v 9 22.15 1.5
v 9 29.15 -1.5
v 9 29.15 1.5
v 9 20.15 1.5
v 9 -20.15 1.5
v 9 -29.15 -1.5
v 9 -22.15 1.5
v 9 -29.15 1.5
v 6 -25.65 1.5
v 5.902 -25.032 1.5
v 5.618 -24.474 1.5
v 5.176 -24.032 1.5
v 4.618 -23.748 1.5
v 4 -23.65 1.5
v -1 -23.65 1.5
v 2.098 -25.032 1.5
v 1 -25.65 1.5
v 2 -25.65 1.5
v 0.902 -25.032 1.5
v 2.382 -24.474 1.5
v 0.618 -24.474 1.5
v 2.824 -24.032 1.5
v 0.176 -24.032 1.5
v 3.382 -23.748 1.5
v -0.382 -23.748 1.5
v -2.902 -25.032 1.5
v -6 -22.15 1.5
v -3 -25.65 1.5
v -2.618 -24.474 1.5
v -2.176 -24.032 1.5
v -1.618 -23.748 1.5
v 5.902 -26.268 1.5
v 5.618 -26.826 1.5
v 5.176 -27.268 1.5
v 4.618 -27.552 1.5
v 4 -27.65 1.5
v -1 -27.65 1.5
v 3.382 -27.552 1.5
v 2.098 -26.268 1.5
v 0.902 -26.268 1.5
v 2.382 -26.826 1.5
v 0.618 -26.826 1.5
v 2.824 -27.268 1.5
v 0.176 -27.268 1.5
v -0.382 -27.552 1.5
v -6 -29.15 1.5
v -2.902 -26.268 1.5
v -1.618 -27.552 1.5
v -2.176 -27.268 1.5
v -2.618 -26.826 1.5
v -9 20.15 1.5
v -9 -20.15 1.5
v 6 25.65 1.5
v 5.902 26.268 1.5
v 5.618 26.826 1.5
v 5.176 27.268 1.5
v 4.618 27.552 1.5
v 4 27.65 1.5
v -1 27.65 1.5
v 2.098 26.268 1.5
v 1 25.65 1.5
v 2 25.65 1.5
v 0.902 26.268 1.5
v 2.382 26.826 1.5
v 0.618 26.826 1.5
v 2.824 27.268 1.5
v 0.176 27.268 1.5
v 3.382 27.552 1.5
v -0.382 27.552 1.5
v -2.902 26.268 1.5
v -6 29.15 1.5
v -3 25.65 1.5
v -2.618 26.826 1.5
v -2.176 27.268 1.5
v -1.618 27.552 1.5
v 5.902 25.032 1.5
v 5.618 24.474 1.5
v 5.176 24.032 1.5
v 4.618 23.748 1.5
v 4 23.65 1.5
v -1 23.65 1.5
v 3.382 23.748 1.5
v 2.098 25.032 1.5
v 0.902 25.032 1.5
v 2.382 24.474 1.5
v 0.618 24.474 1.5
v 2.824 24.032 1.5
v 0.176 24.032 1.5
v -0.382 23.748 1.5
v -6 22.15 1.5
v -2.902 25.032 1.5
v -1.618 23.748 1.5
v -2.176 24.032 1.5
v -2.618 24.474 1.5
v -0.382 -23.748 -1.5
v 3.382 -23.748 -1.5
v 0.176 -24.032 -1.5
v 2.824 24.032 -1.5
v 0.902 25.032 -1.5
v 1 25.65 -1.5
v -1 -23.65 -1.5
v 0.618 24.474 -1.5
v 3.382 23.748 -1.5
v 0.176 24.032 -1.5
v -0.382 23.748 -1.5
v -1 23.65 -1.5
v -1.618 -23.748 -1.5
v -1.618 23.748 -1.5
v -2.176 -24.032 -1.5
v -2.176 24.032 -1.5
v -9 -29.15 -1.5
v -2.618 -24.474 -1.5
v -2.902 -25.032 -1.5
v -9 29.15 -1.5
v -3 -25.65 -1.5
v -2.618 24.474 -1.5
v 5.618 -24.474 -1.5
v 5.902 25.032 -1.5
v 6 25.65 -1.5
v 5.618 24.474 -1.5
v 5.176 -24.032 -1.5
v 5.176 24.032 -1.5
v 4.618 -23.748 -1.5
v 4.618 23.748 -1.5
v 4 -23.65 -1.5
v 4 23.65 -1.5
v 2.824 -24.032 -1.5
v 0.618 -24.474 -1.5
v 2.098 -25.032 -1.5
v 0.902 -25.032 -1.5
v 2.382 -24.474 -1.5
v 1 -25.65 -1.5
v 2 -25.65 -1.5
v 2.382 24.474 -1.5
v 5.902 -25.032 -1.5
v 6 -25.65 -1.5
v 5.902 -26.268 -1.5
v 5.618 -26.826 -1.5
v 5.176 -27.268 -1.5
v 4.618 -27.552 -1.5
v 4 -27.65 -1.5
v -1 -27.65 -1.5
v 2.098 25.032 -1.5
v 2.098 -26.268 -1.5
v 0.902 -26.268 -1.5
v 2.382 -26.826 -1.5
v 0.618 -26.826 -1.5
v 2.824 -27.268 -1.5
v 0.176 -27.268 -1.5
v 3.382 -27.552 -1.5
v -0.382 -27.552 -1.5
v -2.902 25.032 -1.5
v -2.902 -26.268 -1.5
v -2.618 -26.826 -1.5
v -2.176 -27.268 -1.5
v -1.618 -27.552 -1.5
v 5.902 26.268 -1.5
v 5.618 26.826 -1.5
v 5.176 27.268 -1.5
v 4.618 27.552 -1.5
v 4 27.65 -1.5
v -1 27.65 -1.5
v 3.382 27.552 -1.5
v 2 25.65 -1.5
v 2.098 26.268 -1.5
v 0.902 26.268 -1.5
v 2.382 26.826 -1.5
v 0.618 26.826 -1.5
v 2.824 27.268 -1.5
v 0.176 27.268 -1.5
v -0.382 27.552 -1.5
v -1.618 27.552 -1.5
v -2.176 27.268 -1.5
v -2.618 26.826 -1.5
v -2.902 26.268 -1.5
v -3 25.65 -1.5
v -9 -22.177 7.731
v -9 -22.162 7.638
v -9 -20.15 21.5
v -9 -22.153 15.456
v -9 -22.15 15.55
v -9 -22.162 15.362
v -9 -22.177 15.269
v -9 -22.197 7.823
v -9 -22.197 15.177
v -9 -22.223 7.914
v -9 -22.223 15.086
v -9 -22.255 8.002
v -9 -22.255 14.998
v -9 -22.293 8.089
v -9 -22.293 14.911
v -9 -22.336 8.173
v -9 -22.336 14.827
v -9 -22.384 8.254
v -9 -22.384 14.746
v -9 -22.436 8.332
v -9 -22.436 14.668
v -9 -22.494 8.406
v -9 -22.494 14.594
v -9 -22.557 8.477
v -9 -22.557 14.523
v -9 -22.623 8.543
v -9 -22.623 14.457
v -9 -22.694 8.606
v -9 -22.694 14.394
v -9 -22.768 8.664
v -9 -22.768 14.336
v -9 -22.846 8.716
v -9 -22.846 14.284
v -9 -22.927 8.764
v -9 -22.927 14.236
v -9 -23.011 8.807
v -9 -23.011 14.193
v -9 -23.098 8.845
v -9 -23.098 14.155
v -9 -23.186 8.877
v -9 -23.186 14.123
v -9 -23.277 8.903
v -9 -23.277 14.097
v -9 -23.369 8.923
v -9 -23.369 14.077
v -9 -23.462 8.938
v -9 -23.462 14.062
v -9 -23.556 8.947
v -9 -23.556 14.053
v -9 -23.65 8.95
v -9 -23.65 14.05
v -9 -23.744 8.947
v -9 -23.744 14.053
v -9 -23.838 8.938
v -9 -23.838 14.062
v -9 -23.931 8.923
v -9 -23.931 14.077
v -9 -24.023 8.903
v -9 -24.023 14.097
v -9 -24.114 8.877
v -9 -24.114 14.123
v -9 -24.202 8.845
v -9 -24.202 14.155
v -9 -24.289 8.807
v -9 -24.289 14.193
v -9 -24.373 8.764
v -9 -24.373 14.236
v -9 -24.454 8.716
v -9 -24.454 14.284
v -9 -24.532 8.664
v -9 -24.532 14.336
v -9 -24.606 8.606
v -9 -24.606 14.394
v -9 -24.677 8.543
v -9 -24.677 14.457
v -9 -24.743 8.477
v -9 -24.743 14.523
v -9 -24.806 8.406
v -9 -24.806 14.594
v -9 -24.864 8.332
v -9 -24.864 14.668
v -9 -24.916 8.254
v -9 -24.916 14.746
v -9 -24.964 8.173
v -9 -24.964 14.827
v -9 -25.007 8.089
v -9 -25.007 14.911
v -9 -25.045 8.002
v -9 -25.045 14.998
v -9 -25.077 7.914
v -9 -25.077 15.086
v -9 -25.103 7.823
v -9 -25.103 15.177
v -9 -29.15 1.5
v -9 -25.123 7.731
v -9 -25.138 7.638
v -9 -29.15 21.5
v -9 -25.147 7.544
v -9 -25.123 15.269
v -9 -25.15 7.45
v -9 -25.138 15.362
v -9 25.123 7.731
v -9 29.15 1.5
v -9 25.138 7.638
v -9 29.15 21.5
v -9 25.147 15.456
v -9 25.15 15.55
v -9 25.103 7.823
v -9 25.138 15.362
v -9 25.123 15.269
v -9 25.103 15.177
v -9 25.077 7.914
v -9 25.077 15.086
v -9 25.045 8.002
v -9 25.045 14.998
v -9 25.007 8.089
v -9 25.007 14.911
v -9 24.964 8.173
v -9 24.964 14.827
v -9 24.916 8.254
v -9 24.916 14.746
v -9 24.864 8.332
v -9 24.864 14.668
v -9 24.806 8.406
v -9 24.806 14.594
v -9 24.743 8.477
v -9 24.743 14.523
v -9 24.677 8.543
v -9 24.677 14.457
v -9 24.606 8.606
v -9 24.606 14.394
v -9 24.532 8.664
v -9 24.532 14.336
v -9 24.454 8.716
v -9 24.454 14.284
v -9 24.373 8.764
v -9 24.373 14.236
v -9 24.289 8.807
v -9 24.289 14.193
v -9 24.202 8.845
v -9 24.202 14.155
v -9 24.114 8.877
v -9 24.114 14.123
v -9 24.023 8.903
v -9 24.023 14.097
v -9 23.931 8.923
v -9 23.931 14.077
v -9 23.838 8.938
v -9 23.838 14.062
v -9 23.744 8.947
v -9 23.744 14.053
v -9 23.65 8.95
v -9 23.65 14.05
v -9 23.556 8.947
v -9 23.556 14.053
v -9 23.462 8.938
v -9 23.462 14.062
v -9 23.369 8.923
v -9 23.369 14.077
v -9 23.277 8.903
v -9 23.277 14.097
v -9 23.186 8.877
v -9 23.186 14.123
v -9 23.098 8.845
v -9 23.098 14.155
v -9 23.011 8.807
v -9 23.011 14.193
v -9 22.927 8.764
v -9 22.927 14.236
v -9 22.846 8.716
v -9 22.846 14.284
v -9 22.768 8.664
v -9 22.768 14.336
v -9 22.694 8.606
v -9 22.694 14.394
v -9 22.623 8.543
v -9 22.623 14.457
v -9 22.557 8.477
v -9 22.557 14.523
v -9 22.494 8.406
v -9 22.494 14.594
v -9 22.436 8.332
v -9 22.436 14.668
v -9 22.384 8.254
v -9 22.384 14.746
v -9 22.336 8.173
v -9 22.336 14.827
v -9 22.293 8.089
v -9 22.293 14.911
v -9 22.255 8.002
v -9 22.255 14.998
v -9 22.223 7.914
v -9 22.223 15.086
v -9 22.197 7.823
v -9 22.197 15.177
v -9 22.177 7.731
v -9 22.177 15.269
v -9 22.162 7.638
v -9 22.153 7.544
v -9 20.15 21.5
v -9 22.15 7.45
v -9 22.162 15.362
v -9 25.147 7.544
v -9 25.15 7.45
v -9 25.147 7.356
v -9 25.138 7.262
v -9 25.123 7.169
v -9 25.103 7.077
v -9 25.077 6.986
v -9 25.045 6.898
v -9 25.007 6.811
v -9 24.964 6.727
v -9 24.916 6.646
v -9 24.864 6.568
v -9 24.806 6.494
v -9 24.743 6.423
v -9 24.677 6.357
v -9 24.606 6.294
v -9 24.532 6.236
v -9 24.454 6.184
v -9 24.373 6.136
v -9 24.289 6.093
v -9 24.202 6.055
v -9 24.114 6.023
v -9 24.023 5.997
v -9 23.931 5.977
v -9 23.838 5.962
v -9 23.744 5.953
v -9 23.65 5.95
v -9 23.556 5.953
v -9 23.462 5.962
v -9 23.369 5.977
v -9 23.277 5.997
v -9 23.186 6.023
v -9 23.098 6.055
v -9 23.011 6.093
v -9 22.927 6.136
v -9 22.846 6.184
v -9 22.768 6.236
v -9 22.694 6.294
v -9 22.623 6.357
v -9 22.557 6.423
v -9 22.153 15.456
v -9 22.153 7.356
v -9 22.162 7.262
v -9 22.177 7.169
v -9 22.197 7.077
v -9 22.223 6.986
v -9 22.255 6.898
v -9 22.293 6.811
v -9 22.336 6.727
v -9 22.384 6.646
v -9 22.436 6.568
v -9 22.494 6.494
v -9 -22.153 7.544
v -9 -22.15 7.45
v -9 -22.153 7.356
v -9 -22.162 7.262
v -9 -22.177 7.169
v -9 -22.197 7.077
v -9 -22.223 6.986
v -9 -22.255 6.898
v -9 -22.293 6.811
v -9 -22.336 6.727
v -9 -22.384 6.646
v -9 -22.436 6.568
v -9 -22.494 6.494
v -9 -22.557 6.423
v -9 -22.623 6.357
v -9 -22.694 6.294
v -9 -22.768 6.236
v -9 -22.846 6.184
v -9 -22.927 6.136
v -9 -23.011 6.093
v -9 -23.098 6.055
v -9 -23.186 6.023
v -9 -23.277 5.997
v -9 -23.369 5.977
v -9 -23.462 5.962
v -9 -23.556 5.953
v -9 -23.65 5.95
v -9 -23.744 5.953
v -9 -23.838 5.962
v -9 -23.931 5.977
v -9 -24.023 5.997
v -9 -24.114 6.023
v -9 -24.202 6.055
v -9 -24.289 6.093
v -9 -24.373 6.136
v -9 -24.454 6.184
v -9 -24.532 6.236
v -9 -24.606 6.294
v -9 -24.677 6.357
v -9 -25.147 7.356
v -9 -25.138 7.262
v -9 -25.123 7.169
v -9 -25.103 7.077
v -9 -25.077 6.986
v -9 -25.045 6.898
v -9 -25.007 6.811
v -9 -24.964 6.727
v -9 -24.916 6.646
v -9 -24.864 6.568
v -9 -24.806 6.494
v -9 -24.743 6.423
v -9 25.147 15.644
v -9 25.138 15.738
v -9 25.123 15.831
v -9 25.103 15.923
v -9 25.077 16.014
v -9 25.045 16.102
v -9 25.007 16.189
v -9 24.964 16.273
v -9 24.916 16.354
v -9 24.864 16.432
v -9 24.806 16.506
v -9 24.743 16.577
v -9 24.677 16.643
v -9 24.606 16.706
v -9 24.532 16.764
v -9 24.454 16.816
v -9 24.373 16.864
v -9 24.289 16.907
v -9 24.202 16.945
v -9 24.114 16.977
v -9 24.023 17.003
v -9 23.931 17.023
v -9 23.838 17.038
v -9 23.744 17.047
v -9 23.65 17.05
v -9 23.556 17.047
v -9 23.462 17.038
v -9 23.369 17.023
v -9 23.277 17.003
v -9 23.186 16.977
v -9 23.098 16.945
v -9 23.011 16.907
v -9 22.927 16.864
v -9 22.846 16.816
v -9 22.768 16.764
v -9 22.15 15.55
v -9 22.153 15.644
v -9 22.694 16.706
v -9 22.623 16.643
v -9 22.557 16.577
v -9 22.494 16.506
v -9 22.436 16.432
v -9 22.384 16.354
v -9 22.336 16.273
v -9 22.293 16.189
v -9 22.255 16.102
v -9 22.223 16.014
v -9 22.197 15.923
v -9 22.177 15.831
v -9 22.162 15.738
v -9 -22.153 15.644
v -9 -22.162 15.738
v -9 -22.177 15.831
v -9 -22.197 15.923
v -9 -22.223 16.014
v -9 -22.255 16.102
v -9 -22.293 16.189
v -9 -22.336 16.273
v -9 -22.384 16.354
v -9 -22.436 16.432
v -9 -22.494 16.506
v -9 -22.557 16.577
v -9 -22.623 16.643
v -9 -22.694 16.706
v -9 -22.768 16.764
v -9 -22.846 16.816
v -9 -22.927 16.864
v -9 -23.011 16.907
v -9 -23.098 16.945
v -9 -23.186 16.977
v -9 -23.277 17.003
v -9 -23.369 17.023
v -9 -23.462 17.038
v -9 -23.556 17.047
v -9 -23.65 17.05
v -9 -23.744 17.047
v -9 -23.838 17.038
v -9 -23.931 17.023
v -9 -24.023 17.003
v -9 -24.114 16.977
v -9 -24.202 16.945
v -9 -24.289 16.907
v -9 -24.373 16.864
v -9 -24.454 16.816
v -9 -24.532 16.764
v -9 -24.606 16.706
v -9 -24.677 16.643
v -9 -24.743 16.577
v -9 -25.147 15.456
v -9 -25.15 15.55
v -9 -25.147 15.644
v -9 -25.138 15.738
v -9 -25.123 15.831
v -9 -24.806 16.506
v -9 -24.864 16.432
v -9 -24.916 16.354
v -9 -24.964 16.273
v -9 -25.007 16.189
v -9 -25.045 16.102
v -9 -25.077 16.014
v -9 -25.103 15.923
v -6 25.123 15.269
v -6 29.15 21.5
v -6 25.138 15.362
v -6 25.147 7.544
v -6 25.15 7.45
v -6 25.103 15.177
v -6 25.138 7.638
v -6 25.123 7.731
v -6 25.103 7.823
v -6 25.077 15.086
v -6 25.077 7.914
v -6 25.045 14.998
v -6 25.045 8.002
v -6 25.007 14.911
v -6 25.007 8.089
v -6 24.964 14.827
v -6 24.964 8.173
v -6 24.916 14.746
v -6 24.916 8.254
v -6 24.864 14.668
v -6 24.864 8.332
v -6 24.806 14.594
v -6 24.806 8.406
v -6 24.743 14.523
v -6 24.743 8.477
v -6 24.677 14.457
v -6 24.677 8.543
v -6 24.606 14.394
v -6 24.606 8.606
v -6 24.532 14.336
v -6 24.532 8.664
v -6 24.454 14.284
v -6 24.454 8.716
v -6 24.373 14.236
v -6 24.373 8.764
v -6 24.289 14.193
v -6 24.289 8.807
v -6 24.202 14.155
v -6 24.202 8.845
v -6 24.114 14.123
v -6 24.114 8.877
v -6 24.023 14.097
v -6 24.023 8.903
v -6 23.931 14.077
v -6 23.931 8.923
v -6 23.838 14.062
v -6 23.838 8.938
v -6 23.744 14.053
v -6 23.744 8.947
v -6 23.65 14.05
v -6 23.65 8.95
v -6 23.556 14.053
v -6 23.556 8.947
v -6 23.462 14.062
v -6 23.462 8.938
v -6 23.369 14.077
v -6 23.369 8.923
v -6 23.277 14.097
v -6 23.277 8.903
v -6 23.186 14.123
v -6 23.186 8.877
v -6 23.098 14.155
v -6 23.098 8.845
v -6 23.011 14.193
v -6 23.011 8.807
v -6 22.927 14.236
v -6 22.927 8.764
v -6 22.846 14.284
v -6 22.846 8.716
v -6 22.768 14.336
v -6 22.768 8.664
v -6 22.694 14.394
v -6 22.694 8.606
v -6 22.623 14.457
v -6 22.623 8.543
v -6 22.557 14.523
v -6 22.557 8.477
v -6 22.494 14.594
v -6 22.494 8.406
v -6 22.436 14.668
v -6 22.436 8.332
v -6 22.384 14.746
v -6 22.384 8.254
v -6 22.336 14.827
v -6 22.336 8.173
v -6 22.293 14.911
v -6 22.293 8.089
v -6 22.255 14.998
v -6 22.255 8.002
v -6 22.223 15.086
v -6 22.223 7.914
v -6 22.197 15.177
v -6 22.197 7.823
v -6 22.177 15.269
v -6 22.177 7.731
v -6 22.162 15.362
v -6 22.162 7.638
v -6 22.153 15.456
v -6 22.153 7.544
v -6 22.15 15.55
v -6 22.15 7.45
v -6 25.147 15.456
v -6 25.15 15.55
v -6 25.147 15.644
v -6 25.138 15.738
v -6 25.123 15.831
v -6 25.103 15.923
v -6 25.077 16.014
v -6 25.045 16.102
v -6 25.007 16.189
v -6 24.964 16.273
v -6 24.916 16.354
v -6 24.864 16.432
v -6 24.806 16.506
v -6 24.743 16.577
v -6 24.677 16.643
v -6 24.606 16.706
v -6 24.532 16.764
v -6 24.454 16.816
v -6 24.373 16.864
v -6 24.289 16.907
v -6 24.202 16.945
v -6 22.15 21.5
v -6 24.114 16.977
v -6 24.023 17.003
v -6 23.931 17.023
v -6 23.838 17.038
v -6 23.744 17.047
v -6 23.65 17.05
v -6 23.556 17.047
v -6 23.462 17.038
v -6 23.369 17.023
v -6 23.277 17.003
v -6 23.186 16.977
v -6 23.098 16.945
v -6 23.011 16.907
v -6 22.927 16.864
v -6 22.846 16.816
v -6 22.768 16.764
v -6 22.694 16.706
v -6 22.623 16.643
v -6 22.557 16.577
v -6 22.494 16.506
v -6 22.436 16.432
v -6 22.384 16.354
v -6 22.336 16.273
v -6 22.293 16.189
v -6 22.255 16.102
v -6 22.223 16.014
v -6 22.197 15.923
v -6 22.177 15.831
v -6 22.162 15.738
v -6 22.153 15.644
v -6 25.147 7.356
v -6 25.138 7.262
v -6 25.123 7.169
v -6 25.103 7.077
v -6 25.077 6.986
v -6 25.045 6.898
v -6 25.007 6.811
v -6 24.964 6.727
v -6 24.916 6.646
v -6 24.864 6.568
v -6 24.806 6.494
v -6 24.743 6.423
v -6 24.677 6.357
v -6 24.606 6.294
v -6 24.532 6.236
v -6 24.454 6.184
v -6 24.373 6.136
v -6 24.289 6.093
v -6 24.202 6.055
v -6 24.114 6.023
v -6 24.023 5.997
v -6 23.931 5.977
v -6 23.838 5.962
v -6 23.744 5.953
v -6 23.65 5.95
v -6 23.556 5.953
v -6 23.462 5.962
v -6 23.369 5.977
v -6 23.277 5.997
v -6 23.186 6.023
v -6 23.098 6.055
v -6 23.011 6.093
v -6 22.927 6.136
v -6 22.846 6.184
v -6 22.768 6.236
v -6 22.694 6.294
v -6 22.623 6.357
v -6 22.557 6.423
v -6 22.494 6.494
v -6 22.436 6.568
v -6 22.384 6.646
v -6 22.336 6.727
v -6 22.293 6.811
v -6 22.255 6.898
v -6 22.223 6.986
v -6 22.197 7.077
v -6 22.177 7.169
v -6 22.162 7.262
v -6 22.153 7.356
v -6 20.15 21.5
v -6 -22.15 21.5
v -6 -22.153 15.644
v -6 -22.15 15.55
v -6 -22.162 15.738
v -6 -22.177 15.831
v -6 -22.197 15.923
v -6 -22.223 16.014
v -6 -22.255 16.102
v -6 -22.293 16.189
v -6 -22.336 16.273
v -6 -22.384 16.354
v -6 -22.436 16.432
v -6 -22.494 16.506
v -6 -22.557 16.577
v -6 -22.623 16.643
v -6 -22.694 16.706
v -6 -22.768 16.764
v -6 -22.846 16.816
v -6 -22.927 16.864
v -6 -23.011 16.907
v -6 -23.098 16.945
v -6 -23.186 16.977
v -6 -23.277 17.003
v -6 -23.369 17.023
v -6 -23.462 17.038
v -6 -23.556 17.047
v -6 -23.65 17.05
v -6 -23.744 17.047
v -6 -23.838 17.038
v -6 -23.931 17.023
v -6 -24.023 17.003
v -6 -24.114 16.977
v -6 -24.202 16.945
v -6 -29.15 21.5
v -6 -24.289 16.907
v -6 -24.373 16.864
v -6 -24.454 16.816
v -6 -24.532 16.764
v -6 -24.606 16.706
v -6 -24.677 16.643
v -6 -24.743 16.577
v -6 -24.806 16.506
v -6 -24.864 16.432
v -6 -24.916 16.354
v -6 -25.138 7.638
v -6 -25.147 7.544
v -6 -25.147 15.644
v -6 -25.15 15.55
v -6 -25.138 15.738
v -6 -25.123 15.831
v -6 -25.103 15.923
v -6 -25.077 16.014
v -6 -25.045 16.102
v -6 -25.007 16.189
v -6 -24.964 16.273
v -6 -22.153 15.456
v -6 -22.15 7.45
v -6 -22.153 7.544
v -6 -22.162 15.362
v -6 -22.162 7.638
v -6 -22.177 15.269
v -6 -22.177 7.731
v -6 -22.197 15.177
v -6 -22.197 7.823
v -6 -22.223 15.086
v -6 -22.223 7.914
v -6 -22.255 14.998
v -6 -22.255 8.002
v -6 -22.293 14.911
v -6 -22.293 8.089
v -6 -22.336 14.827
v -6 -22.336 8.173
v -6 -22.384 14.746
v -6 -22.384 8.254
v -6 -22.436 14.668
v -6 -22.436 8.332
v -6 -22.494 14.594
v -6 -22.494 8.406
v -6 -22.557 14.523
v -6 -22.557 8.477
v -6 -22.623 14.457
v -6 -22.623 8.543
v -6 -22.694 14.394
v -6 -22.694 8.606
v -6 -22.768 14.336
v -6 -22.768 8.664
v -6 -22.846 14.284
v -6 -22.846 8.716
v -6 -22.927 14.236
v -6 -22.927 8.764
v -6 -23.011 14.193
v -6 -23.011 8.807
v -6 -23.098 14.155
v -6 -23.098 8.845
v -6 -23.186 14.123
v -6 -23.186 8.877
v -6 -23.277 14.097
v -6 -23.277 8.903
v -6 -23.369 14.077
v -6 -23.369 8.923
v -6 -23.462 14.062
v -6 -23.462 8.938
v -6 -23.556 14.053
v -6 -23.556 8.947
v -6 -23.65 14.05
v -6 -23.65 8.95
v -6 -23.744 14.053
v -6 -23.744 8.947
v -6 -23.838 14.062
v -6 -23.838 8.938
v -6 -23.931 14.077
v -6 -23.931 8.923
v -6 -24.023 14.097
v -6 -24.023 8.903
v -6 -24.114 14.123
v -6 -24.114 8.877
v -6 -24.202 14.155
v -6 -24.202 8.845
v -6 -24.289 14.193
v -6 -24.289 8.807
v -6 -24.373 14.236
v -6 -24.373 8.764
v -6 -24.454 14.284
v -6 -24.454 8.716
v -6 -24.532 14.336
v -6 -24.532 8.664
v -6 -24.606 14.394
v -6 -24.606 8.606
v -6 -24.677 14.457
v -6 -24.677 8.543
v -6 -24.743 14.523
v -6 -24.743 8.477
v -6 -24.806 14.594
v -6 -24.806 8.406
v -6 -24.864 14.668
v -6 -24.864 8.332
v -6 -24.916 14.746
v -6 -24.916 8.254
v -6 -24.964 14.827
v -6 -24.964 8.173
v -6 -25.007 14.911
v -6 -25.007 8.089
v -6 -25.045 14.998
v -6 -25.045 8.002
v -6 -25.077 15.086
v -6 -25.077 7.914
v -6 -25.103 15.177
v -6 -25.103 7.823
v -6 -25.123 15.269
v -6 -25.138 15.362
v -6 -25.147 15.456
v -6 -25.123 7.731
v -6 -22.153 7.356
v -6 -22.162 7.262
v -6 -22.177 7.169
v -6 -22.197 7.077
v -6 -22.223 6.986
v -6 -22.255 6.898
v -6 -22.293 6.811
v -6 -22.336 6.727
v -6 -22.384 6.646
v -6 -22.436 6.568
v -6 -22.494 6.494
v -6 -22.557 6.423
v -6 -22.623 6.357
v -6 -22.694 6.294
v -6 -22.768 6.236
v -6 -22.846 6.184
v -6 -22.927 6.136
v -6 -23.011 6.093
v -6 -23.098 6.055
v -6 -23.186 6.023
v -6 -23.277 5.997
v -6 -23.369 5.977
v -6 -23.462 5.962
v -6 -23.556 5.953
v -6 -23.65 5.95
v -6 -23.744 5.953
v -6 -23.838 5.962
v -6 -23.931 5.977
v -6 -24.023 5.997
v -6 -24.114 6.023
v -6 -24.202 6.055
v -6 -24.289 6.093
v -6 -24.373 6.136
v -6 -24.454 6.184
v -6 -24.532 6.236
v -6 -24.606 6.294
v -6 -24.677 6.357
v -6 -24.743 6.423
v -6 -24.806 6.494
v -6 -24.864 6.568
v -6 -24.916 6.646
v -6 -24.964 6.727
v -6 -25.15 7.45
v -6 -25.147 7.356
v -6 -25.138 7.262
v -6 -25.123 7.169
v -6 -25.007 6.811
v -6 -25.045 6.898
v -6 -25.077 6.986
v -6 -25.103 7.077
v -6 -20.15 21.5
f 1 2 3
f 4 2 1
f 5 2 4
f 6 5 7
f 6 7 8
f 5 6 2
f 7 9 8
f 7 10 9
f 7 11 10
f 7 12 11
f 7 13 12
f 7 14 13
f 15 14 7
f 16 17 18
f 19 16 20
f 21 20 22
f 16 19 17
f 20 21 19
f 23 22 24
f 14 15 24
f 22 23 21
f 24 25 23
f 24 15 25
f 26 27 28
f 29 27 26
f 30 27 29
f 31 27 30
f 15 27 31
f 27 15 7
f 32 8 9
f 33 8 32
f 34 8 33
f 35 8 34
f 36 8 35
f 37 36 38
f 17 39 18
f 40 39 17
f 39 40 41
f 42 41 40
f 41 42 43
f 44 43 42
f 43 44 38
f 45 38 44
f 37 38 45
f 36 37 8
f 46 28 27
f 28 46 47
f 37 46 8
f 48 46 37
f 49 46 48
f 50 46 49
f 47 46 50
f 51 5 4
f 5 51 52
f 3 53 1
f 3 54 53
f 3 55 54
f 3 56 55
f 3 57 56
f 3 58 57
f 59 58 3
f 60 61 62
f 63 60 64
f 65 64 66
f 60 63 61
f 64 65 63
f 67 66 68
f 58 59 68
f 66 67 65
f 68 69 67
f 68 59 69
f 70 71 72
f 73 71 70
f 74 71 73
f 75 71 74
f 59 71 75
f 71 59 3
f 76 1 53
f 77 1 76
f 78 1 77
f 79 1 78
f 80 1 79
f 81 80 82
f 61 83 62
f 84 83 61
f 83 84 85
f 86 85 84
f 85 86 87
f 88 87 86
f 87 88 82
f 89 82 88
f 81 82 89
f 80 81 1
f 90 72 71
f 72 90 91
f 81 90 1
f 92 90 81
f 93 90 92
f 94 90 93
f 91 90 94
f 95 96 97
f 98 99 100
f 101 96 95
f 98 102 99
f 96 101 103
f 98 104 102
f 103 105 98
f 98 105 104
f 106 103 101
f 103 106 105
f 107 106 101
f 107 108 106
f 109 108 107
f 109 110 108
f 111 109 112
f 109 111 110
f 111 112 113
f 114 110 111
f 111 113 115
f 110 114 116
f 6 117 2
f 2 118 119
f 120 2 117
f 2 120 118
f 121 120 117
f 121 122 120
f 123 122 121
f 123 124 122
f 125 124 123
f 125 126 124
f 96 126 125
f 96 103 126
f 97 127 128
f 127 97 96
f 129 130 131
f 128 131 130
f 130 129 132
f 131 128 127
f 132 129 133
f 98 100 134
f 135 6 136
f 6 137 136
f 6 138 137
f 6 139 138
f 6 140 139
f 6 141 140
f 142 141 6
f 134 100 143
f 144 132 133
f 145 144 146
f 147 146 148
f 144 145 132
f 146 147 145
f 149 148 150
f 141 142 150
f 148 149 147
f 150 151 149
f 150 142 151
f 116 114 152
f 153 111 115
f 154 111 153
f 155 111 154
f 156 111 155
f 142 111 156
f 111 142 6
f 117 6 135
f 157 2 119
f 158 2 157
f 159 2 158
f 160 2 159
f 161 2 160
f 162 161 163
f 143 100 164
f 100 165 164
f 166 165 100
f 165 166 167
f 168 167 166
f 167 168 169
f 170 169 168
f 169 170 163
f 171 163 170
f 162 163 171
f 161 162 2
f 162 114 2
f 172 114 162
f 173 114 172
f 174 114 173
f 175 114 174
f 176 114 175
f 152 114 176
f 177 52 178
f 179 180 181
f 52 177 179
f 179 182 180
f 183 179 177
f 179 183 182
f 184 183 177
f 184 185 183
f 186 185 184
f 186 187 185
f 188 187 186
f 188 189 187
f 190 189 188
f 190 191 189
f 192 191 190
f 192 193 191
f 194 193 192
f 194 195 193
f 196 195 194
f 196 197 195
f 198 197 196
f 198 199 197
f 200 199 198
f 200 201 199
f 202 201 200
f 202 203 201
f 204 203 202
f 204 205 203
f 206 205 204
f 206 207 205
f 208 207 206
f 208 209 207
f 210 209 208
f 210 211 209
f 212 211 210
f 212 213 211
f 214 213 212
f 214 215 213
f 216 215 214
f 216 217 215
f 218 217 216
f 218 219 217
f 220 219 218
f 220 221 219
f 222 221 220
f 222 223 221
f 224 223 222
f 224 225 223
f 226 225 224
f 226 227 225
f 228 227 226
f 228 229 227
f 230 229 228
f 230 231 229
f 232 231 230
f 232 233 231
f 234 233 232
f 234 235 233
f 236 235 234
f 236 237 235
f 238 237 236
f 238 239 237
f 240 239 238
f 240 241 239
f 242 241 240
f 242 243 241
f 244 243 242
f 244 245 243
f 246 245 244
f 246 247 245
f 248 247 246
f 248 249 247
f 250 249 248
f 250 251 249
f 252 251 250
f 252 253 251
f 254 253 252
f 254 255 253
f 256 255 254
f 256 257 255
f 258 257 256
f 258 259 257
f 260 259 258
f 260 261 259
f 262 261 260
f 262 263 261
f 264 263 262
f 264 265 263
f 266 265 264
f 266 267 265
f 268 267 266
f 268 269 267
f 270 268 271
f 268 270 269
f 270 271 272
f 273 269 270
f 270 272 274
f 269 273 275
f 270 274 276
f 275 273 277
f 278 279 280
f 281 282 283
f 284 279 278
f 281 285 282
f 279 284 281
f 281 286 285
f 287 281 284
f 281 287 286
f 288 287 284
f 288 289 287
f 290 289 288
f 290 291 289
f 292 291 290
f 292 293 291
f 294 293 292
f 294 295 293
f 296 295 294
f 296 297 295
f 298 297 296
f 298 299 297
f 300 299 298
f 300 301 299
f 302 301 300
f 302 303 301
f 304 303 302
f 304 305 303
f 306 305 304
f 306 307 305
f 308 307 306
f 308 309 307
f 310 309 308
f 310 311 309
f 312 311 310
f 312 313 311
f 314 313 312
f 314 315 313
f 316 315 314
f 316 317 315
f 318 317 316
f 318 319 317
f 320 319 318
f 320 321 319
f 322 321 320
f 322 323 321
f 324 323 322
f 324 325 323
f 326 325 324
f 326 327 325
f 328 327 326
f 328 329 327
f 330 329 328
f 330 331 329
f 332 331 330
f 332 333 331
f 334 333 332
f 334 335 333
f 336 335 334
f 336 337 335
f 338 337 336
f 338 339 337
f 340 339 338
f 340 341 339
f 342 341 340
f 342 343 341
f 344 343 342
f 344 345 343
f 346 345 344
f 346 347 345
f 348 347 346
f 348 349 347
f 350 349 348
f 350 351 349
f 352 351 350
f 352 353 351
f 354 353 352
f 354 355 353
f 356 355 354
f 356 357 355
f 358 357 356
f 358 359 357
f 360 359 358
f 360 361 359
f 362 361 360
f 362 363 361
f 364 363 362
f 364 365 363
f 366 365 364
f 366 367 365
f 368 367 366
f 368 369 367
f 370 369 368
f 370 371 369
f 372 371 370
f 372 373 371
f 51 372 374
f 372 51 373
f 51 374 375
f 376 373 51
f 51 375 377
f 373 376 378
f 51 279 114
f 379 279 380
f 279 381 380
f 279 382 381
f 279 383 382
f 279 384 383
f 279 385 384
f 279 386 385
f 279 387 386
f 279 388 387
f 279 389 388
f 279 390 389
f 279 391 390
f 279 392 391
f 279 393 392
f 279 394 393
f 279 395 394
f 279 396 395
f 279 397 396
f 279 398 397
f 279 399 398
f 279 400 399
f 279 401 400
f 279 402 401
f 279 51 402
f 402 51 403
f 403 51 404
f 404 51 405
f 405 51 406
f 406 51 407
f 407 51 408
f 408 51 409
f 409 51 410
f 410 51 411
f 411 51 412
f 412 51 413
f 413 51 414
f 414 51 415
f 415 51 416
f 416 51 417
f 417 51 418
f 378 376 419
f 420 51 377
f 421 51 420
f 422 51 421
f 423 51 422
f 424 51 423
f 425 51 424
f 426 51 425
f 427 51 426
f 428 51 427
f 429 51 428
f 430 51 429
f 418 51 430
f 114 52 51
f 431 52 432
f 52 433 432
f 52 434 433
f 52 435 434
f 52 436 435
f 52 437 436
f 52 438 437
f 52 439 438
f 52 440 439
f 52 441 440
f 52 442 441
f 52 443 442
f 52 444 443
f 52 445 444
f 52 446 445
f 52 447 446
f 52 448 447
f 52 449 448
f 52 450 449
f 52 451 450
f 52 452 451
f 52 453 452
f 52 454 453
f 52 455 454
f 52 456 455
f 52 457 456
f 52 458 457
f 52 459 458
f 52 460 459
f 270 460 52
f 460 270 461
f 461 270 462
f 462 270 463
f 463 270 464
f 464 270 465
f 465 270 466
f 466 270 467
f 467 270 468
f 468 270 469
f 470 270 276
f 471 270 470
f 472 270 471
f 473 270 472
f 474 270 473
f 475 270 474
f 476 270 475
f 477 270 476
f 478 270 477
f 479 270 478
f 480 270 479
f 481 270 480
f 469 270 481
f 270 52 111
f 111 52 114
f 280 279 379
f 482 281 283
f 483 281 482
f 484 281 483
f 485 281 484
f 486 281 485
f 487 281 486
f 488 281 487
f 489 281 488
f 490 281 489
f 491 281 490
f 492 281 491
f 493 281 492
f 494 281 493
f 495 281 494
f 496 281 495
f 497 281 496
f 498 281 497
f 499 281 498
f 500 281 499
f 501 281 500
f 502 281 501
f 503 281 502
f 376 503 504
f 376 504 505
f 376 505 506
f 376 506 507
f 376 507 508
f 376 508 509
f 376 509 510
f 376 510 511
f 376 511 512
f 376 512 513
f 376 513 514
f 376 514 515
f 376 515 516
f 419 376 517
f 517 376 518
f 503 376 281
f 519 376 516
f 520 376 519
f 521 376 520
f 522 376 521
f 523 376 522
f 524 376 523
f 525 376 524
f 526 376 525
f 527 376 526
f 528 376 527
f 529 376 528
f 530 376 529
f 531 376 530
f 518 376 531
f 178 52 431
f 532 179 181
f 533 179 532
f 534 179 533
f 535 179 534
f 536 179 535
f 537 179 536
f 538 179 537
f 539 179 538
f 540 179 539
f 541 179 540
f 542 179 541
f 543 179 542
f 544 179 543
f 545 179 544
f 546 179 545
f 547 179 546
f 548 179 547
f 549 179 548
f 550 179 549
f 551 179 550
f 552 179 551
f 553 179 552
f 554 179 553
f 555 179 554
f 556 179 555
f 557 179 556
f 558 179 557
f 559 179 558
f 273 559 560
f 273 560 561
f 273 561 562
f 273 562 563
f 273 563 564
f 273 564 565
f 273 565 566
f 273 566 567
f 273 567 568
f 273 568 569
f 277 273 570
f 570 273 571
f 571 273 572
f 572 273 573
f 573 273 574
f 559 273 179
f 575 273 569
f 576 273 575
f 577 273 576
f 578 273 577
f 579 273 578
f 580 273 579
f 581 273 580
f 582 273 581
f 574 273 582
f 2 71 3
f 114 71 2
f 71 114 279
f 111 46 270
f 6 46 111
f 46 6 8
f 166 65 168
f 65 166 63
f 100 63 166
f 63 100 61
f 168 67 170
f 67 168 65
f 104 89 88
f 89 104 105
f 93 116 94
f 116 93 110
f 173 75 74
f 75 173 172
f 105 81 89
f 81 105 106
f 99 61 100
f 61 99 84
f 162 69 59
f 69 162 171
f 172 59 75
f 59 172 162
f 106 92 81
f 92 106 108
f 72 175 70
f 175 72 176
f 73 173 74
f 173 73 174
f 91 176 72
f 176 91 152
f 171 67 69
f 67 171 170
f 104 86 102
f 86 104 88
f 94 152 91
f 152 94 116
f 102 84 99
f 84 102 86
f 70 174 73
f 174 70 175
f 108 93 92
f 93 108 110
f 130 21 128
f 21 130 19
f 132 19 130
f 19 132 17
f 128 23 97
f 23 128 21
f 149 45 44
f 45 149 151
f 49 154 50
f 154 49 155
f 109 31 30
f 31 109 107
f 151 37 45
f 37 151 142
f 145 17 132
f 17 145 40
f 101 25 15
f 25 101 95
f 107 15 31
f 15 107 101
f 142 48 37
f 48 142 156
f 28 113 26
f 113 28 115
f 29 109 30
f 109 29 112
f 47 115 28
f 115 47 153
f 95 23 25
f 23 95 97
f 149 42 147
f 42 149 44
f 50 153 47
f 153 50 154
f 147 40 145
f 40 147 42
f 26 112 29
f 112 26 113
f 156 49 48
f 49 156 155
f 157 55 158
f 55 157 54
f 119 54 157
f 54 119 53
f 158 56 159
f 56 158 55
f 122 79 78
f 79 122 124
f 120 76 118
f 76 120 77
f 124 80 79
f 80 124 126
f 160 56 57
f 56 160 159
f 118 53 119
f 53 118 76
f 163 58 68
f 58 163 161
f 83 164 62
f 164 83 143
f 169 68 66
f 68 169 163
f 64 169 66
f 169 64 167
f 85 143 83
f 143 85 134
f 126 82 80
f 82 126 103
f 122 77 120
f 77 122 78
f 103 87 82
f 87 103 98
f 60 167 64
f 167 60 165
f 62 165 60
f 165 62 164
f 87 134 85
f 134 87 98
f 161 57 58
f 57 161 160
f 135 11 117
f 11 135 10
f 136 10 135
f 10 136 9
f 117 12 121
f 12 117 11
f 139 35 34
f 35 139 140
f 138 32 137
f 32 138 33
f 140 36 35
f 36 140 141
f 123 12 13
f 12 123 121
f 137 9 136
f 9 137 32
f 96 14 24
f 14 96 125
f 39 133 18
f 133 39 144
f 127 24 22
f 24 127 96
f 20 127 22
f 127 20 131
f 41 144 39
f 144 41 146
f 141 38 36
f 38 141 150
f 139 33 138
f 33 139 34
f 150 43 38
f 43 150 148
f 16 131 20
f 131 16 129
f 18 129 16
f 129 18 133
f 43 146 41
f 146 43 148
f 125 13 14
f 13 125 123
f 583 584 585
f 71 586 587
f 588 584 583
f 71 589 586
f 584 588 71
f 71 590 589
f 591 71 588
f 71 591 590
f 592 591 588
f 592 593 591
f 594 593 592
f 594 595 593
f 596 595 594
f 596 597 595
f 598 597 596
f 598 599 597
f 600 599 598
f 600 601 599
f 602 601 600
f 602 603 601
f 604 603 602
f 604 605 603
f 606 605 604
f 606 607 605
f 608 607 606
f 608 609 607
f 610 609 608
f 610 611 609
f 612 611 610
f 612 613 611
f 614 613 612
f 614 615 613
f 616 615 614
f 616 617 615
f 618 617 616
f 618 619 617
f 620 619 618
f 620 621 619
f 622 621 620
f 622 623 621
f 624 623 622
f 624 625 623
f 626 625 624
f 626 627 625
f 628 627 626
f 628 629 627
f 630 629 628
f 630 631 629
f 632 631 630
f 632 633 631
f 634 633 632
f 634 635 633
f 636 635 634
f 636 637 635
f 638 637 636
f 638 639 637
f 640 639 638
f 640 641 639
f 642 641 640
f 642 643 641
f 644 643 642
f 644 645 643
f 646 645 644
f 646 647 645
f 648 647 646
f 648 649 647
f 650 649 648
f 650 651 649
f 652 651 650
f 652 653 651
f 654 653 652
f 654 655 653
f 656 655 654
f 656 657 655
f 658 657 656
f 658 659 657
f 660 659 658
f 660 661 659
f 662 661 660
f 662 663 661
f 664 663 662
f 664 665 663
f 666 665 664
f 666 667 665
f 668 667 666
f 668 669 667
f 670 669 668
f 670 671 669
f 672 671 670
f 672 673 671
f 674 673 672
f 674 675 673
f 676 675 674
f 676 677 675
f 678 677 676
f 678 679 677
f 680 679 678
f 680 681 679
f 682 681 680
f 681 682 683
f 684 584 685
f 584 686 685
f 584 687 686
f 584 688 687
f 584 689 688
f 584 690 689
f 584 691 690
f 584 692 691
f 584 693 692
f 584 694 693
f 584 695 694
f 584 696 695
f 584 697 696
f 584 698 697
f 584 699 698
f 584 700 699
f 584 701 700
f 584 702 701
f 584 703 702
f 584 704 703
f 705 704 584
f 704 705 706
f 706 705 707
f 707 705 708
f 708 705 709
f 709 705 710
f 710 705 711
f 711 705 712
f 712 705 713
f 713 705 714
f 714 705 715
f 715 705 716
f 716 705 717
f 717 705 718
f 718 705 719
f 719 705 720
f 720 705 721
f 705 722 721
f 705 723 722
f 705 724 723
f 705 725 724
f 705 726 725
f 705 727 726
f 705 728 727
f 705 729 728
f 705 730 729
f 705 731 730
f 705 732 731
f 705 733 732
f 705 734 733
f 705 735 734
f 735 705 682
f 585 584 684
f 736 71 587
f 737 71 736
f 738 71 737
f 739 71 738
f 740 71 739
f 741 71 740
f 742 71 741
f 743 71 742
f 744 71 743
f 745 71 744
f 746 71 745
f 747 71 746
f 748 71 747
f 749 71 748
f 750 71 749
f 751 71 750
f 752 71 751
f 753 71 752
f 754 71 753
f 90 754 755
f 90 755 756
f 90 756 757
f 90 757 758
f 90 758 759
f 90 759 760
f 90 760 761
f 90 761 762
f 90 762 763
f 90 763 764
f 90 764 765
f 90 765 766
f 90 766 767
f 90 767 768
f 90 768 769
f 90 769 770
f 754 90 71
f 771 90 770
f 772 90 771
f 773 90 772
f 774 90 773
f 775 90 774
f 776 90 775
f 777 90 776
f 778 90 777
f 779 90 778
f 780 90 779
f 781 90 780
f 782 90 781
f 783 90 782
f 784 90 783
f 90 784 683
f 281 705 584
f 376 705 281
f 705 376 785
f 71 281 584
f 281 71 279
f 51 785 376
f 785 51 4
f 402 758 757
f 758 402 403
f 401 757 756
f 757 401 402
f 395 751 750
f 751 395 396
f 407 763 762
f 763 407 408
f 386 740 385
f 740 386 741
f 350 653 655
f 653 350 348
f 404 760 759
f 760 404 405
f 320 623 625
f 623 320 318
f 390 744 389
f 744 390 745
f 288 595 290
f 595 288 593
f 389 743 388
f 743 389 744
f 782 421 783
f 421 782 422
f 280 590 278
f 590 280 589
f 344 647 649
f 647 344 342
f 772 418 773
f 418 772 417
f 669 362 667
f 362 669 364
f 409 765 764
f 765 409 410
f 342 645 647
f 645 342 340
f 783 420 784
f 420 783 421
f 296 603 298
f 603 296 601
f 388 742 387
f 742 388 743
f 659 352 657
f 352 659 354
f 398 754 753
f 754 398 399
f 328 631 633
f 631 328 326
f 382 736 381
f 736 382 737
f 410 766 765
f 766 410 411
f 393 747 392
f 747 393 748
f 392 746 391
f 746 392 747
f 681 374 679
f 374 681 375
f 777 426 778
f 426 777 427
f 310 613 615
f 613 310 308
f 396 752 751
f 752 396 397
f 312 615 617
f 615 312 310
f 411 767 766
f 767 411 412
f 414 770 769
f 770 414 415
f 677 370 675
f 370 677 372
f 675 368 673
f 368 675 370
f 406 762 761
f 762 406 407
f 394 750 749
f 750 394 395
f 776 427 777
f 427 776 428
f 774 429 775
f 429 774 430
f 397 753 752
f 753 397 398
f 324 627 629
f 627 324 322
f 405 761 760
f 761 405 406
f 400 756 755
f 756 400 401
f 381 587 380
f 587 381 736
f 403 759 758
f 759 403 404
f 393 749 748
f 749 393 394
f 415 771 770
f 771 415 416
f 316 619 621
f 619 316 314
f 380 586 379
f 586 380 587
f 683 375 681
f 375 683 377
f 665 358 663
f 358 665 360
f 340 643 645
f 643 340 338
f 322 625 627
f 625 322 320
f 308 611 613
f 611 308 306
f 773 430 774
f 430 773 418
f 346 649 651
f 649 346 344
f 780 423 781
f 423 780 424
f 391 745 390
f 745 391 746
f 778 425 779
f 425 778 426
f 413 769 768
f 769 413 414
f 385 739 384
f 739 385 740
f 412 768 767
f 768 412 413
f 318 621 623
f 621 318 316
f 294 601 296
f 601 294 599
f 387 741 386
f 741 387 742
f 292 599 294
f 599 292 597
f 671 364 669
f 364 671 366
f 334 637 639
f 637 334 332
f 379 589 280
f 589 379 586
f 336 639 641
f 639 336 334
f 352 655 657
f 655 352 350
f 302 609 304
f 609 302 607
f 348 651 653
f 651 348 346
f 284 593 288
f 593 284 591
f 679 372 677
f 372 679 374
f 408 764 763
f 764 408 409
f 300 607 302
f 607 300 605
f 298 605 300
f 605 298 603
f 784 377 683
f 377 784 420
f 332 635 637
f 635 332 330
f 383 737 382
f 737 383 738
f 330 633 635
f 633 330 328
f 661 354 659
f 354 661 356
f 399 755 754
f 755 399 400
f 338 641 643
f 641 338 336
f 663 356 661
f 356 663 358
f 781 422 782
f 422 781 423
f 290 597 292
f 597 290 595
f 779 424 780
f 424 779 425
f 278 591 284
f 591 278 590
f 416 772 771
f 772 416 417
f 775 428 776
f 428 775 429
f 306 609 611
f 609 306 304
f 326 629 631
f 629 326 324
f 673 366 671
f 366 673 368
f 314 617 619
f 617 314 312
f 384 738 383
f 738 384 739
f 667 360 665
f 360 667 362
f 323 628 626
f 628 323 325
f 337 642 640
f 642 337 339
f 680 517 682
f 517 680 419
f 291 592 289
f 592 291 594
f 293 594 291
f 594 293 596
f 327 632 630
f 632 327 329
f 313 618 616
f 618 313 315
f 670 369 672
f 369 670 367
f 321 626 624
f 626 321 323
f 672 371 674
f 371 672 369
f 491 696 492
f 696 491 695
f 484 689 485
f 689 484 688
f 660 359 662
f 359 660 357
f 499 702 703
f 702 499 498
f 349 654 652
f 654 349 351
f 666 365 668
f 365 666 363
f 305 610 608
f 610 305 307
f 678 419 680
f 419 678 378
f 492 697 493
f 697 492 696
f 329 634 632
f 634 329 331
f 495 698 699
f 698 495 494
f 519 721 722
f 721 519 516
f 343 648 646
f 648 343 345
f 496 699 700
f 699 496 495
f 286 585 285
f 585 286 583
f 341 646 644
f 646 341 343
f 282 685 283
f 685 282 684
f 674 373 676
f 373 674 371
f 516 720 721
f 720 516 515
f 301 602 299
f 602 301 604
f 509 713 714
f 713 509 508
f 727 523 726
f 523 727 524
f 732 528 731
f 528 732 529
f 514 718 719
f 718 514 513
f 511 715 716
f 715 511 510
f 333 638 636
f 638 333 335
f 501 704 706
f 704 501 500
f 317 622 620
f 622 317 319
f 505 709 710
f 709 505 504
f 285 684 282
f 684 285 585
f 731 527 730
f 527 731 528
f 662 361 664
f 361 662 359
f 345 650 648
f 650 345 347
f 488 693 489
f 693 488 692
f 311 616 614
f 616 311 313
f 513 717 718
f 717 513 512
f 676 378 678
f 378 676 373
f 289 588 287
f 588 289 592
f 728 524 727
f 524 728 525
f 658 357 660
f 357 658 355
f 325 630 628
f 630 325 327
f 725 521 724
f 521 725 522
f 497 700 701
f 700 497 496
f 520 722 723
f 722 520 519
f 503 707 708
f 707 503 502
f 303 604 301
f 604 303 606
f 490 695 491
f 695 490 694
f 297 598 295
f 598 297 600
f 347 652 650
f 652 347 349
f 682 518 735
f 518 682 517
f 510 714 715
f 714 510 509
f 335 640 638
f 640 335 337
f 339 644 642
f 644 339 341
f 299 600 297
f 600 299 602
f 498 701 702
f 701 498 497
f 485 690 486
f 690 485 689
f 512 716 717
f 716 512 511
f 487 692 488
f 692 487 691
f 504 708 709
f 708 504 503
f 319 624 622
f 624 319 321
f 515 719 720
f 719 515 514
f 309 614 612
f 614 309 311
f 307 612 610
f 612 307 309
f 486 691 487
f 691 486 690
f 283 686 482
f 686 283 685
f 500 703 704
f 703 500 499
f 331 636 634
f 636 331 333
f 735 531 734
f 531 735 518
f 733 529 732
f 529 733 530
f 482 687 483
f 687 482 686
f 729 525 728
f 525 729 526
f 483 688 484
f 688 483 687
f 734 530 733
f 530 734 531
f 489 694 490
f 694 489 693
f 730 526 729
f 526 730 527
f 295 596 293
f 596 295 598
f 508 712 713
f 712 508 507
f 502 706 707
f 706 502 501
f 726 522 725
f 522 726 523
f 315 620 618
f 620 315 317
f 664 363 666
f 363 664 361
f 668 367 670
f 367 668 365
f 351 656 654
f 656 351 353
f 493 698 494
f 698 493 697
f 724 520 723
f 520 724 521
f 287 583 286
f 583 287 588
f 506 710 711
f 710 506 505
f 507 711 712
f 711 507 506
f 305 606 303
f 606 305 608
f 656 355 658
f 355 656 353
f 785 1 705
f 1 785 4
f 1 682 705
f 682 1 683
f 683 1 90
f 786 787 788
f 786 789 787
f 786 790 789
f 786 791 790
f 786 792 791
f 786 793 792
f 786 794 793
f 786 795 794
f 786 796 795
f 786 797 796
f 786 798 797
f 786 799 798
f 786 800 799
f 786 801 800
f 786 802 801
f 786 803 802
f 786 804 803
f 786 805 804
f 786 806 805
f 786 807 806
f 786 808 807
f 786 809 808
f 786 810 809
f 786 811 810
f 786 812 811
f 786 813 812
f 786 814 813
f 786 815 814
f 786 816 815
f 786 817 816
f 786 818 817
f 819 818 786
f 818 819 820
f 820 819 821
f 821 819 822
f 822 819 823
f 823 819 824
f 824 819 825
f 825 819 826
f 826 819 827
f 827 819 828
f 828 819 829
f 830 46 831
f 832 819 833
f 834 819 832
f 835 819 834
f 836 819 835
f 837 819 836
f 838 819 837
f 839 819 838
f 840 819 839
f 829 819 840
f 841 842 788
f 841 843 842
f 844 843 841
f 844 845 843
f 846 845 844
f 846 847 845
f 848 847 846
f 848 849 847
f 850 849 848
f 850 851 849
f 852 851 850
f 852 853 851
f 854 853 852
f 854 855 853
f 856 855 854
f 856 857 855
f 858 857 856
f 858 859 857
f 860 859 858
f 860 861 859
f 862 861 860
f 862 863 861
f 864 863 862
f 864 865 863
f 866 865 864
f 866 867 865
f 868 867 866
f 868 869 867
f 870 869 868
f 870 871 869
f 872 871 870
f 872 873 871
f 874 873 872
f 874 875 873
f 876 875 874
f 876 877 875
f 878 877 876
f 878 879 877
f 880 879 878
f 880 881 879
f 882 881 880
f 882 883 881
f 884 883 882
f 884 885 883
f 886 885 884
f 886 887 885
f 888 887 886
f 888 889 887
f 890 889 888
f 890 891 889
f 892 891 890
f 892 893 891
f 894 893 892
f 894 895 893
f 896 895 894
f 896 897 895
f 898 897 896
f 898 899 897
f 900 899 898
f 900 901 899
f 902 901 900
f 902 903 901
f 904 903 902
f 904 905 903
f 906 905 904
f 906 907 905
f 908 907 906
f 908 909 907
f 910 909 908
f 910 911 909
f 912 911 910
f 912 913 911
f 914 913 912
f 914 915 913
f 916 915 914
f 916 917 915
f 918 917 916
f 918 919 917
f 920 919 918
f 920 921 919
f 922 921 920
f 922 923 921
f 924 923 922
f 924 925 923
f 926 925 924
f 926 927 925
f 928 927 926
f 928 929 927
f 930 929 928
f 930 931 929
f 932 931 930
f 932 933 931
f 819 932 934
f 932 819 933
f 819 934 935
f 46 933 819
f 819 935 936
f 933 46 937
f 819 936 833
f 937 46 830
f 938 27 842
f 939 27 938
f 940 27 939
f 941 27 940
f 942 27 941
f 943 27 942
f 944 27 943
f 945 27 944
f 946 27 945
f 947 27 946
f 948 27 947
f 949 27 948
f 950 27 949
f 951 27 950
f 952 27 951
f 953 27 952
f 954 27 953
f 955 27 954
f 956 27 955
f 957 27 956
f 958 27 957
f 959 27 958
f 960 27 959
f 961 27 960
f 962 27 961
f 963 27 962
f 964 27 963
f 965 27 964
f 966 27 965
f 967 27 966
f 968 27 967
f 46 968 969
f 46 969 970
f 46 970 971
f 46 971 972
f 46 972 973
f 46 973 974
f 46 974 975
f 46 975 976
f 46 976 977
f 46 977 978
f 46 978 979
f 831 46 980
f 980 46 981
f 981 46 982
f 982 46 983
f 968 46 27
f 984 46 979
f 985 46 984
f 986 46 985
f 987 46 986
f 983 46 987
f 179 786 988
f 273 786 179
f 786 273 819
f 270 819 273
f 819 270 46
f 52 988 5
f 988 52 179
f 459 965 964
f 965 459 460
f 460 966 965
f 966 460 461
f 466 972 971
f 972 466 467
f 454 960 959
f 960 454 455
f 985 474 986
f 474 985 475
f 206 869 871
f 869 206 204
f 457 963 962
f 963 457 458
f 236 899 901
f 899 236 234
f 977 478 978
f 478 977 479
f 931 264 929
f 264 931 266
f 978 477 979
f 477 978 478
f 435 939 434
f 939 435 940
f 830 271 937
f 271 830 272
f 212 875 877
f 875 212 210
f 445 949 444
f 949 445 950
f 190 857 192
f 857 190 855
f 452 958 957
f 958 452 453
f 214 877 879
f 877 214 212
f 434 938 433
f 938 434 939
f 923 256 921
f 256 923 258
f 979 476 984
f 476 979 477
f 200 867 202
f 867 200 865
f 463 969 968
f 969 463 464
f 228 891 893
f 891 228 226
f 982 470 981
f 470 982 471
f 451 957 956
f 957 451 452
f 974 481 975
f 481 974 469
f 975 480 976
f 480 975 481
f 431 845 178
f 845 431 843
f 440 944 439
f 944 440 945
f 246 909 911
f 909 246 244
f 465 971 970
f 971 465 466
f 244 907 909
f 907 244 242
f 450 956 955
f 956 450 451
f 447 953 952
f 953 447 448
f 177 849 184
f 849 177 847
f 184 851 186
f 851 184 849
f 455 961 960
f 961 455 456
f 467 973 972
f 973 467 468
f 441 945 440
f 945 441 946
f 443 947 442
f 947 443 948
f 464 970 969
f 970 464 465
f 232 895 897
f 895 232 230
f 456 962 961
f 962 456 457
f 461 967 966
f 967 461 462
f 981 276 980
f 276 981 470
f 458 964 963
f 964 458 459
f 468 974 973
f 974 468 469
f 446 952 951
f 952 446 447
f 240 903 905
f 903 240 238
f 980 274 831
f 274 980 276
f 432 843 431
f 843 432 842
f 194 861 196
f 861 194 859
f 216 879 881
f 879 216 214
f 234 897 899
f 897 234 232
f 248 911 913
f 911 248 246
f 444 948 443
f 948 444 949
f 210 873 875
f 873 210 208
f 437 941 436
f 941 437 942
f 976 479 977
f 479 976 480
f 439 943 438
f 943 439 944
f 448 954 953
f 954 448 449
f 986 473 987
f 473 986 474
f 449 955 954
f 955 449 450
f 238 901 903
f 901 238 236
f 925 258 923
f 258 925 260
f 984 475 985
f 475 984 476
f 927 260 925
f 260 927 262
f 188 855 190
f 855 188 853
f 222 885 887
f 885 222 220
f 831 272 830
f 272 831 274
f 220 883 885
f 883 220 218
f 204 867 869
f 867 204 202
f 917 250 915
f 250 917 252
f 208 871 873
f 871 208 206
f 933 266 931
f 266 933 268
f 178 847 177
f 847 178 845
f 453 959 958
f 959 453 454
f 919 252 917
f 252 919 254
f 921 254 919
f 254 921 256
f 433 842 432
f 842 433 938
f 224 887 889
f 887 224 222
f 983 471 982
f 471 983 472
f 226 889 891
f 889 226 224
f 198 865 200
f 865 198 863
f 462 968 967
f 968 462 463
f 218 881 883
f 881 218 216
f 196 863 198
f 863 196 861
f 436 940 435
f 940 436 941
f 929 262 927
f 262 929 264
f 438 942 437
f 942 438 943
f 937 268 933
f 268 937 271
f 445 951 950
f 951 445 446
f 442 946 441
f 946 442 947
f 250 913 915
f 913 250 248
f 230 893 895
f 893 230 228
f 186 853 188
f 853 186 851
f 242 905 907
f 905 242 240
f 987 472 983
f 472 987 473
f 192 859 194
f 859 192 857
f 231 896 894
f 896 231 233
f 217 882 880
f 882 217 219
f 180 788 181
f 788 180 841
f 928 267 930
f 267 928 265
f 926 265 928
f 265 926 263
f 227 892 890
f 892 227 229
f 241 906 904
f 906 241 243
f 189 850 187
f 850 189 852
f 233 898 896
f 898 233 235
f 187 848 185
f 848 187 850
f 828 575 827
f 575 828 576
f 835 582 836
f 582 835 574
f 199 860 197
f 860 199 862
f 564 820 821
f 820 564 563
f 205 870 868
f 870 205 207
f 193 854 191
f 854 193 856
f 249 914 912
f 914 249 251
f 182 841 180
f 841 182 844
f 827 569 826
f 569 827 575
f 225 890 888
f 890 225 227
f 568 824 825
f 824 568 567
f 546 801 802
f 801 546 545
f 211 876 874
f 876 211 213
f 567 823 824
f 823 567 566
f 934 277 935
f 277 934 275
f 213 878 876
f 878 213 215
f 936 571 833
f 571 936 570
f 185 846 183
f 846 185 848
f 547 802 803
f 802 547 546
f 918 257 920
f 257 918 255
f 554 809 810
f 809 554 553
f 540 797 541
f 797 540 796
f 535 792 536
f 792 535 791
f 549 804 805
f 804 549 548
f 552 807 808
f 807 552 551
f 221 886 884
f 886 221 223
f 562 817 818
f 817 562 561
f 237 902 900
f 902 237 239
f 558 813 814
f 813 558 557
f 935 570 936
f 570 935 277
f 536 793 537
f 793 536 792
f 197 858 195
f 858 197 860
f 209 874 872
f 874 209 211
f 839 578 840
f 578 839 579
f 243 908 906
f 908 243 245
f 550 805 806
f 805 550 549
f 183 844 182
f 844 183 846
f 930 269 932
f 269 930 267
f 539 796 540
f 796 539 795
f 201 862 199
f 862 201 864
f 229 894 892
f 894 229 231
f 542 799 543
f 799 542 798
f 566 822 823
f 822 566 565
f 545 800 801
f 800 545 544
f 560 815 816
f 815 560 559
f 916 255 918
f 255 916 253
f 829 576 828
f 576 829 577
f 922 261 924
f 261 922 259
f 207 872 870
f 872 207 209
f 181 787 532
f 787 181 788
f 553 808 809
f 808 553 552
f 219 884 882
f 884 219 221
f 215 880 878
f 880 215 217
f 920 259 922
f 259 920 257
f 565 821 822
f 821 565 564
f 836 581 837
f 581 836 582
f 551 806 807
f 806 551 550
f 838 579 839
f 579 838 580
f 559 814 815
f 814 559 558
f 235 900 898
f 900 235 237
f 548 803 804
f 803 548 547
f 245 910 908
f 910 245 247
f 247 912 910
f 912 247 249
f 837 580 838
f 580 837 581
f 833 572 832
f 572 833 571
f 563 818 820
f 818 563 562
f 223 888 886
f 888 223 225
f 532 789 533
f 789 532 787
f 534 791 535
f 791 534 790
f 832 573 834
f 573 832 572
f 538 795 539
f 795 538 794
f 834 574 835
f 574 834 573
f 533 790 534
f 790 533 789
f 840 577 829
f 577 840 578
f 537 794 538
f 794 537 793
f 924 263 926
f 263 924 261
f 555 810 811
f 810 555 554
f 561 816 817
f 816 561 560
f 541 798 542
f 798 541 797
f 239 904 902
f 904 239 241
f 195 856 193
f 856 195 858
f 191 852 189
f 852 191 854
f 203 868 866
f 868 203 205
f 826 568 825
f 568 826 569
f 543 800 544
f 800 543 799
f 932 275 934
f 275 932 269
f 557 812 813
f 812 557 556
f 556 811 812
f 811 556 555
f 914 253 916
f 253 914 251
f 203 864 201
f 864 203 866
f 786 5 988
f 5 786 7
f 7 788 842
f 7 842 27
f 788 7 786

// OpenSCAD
//https://www.thingiverse.com/thing:40590
 
//arm();
main();

module main(){

	servo_width = 20;
	servo_length=40.3;
	base_length = servo_length+18;
	base_width = 18;
	base_thickness = 3;
	
	union () {
		difference () {
			cube ([base_width,base_length,base_thickness], center = true);	//base
			translate ([-(base_width/2)+8,base_length/2-3.5,0]) cylinder(h = 30, r = 2, center = true, $fn=20); //holes
			translate ([-(base_width/2)+8,-base_length/2+3.5,0]) cylinder(h = 30, r = 2, center = true, $fn=20); //holes

			translate ([(base_width/2)-5,base_length/2-3.5,0]) cylinder(h = 30, r = 2, center = true, $fn=20); //holes
			translate ([(base_width/2)-5,-base_length/2+3.5,0]) cylinder(h = 30, r = 2, center = true, $fn=20); //holes
		}
		translate ([-base_width/2,servo_length/2,base_thickness/2]) arm(servo_width,base_width);
		mirror([0,1,0]) translate ([-base_width/2,servo_length/2,base_thickness/2]) arm(servo_width,base_width);

	}
}

module arm(servo_width,base_width){
	hole_distance = 8.1;
	hole_diameter = 3;
	
	echo(servo_width);
	
	 union () {
		difference () {
	          	translate([0,0,0]) cube( [3,9,servo_width]);	 
			translate (v=[0,3.5,servo_width/2-hole_distance/2]) { rotate(a=[0,90,0]) {cylinder(h = 30,r=hole_diameter /2, center = true, $fn=100);}}
			translate (v=[0,3.5,servo_width/2+hole_distance/2]) { rotate(a=[0,90,0]) {cylinder(h = 30,r=hole_diameter /2, center = true, $fn=100);}}
		}
		translate (v=[3,0,servo_width]) mirror([0,0,1]){
			polyhedron ( points = [[0, 0, servo_width], [0, 2, servo_width], [0, 2, 0], [0, 0, 0], [base_width-3, 0, servo_width], [base_width-3, 2, servo_width]], 
			faces = [[0,3,2], [0,2,1], [3,0,4], [1,2,5], [0,5,4], [0,1,5],  [5,2,4], [4,2,3], ]);
		}
	}
}
